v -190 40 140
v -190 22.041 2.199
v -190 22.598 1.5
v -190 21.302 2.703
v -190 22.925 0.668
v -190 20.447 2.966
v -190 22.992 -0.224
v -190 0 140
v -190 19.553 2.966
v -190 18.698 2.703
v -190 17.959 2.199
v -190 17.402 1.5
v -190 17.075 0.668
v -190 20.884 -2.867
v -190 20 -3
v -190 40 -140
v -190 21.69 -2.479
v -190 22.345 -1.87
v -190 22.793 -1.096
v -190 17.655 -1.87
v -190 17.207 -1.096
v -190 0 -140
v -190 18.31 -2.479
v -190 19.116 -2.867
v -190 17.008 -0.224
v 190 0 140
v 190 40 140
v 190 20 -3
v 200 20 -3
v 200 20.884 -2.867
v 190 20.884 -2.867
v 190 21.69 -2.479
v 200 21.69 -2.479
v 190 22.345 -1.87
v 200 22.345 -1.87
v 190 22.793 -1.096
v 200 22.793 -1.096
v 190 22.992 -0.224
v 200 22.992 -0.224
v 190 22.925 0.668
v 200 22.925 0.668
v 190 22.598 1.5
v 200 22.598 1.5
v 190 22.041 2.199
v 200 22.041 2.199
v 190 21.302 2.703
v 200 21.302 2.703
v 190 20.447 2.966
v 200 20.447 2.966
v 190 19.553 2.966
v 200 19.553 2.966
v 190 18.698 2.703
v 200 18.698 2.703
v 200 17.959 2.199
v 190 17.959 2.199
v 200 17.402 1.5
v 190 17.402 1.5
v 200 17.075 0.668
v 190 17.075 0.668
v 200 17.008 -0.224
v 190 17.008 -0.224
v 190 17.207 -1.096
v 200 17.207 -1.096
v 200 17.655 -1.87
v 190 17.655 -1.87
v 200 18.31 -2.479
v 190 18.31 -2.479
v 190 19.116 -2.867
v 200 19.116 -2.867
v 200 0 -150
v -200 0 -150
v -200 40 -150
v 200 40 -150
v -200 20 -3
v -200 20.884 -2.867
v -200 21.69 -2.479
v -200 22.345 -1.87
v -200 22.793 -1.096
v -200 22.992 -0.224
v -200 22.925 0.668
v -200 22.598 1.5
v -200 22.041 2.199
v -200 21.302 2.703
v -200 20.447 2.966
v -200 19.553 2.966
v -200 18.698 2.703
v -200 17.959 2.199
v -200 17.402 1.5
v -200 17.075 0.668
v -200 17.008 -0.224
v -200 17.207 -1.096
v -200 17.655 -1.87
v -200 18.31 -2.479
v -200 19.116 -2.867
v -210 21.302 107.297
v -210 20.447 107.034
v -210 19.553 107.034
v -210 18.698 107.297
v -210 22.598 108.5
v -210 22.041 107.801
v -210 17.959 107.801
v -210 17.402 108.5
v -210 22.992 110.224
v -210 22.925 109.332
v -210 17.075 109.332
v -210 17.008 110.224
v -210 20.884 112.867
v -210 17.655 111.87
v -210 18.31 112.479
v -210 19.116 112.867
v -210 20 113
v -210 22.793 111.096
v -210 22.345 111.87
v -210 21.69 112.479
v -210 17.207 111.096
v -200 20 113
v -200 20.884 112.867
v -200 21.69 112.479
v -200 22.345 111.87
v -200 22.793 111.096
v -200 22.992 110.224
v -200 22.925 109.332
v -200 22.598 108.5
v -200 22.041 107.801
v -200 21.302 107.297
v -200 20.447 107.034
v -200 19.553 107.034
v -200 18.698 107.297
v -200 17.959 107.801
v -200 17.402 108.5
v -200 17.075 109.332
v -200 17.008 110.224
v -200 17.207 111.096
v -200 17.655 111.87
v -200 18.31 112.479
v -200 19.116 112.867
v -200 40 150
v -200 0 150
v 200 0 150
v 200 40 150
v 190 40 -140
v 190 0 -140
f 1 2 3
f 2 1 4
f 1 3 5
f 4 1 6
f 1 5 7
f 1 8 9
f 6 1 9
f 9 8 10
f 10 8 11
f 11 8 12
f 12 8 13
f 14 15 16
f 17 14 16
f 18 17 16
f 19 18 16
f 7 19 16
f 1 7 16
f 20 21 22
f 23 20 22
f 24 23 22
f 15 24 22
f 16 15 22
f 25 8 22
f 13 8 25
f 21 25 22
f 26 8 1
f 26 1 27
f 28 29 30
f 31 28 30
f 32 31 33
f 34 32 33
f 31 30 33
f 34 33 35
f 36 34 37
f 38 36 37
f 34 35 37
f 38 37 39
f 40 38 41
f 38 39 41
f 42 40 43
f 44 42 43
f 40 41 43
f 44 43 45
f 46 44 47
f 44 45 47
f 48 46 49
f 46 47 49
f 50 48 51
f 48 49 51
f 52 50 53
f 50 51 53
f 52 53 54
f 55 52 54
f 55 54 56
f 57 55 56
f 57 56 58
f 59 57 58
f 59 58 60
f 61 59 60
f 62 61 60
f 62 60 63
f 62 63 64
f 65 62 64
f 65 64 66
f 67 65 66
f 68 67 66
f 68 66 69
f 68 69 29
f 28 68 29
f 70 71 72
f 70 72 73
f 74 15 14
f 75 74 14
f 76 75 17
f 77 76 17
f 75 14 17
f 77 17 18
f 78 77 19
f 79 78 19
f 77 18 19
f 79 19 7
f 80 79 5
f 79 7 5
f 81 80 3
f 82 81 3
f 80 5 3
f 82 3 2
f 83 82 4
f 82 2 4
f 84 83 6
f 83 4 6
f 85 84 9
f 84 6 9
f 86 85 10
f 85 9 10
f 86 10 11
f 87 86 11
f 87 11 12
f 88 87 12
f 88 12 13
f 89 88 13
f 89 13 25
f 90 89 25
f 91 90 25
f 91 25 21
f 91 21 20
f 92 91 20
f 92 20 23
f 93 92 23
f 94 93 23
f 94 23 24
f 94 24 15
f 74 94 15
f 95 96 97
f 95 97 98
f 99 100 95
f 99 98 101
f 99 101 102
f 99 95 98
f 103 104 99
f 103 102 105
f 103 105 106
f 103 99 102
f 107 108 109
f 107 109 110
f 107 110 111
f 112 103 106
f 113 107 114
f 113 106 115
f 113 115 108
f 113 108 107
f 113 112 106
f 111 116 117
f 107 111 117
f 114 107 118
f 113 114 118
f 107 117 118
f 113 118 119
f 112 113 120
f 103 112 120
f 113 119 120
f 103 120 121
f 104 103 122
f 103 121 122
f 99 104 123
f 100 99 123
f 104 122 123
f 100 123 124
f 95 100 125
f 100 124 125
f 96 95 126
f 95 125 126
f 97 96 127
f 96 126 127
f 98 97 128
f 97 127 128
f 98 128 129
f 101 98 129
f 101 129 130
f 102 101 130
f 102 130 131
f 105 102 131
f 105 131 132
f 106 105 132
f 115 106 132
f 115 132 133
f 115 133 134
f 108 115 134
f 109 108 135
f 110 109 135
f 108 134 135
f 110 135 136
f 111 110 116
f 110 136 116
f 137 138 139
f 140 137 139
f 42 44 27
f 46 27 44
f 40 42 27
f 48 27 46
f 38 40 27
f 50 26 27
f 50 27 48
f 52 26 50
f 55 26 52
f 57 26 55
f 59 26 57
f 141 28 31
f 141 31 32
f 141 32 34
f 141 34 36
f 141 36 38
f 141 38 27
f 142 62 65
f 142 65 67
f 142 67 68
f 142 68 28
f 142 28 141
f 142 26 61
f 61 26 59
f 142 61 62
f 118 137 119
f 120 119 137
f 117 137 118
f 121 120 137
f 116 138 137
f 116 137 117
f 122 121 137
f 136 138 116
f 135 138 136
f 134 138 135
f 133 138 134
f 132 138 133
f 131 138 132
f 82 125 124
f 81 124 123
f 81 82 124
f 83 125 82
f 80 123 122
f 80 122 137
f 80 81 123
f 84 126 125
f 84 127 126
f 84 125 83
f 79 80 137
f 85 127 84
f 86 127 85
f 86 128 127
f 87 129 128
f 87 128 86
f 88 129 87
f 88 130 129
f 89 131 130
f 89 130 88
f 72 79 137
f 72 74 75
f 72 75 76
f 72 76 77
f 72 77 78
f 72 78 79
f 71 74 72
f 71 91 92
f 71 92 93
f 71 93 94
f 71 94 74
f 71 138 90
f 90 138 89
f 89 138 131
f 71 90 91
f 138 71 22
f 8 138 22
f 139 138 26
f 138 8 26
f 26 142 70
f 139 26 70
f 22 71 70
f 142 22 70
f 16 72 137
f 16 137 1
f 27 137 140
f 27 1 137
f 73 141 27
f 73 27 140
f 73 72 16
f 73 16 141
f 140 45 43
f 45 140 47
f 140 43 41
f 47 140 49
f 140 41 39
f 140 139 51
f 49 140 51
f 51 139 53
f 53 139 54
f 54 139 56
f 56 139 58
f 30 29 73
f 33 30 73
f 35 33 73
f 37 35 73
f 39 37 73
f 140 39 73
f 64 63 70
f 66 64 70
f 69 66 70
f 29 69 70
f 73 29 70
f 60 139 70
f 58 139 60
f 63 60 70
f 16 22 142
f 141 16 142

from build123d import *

# Parameters (mm, degrees)
SKETCH1_W           = 400
SKETCH1_H           = 300
SKETCH1_W_2         = 380
SKETCH1_H_2         = 280
BOSS_EXTRUDE1_DEPTH = 40
SKETCH4_R           = 3
BOSS_EXTRUDE4_DEPTH = 10
SKETCH2_R           = 3
CUT_EXTRUDE1_DEPTH  = 400


with BuildPart() as part:
    # Sketch1 → Boss-Extrude1 (new body)
    with BuildSketch(Plane(origin=(0, 0, 0), x_dir=(1, 0, 0), z_dir=(0, 1, 0))):
        Rectangle(SKETCH1_W, SKETCH1_H)
        Rectangle(SKETCH1_W_2, SKETCH1_H_2, mode=Mode.SUBTRACT)
    extrude(amount=BOSS_EXTRUDE1_DEPTH)

    # Sketch4 → Boss-Extrude4 (add)
    with BuildSketch(Plane.ZY.offset(200)):
        with Locations((110, 20)):
            Circle(SKETCH4_R)
    extrude(amount=BOSS_EXTRUDE4_DEPTH)

    # Sketch2 → Cut-Extrude1 (cut)
    with BuildSketch(Plane(origin=(200, 0, 0), x_dir=(0, 0, -1), z_dir=(1, 0, 0))):
        with Locations((0, 20)):
            Circle(SKETCH2_R)
    extrude(amount=-CUT_EXTRUDE1_DEPTH, mode=Mode.SUBTRACT)


solid = part.part
